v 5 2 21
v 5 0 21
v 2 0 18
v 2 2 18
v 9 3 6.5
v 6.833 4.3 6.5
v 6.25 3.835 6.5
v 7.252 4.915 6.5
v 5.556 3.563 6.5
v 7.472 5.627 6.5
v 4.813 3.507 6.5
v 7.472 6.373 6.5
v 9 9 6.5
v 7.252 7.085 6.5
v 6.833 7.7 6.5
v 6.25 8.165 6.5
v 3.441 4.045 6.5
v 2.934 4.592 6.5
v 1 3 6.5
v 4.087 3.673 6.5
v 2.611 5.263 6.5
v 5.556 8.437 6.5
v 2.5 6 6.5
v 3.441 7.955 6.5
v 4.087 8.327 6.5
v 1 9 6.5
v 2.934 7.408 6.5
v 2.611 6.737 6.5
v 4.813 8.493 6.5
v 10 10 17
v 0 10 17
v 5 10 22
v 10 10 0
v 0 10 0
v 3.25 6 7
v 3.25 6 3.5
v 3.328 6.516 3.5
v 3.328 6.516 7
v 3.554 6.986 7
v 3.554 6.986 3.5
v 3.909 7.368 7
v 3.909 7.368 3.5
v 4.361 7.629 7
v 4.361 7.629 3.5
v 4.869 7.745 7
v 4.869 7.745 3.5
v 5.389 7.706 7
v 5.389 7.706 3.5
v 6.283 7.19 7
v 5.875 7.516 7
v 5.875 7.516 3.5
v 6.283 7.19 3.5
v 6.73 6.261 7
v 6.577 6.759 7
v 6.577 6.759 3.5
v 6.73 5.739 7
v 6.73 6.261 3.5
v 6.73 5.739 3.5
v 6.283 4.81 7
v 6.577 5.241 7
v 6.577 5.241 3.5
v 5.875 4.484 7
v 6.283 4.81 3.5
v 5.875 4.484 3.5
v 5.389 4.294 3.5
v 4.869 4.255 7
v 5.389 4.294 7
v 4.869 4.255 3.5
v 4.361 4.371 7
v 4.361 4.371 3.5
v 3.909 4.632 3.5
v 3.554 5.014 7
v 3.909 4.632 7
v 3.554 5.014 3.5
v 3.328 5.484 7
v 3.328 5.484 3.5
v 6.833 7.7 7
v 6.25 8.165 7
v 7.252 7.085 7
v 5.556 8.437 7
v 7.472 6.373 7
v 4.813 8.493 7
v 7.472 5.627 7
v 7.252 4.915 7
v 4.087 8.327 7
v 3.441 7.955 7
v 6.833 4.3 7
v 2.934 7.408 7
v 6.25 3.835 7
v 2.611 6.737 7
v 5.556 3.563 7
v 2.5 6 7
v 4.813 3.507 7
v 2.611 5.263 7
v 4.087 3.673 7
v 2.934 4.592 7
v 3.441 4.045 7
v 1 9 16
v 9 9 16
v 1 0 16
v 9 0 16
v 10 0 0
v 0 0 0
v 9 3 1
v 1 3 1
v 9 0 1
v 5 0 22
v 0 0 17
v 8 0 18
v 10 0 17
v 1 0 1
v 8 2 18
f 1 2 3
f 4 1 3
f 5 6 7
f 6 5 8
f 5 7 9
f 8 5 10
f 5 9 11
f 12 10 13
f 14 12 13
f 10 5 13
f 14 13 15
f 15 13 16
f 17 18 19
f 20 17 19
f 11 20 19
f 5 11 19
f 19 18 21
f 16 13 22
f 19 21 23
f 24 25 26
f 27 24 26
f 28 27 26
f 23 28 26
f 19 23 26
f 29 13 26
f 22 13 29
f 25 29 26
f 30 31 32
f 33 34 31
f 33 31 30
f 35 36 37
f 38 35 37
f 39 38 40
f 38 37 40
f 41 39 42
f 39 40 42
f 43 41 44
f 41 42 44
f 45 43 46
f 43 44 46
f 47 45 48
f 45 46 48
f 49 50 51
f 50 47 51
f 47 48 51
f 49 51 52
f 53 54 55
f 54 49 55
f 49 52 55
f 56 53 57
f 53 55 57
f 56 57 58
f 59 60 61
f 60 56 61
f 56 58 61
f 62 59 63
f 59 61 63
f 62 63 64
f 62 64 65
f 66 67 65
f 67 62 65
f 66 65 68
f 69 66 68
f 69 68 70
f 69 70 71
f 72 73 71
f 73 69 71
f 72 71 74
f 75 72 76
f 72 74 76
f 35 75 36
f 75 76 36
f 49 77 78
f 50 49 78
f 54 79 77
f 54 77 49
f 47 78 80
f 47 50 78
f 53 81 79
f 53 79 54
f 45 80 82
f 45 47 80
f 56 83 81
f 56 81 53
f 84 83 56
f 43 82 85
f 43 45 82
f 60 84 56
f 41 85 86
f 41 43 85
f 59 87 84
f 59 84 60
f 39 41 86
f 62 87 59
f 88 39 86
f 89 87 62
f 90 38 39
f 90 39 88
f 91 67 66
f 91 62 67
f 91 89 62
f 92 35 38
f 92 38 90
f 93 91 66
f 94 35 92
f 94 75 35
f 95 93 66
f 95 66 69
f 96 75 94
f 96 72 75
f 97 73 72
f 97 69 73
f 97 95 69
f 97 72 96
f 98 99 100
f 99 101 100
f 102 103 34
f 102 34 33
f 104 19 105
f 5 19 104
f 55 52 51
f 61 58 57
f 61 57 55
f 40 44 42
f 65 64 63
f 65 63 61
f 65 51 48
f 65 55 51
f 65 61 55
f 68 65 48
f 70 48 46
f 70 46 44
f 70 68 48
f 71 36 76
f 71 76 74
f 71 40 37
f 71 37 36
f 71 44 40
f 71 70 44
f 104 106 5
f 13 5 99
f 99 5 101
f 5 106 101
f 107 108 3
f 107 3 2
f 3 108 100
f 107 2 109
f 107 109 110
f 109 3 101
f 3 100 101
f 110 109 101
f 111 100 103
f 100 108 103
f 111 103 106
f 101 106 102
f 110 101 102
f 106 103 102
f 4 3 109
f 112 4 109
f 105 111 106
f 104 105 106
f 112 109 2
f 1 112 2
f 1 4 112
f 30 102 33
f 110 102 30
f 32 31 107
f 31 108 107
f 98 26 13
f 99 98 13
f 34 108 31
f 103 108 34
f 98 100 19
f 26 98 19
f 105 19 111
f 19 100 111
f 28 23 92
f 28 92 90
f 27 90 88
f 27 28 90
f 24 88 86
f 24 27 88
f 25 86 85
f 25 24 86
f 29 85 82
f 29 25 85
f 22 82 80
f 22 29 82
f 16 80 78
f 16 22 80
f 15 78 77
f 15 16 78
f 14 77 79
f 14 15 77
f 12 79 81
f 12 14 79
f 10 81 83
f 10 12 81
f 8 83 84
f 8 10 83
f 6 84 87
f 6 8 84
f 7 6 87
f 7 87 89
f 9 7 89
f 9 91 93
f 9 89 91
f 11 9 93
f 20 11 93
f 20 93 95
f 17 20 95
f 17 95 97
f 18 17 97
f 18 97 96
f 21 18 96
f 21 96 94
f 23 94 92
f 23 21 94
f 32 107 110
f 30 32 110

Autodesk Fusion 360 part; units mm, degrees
sketch "Sketch1" plane through (0, 0, 0) normal (0, 1, 0) x (1, 0, 0)
  line L0 (0, 0) -> (10, 0)
  line L1 (10, 0) -> (10, -17)
  line L2 (0, -17) -> (0, 0)
  line L3 (0, -17) -> (5, -22)
  line L4 (5, -22) -> (10, -17)
  dimension "d1" = 10
  dimension "d2" = 17
extrude "Extrude1" add sketch "Sketch1" along normal blind 10
sketch "Sketch2" plane through (0, 0, 0) normal (0, 1, 0) x (1, 0, 0)
  line L0 (1, -1) -> (9, -1)
  line L1 (9, -1) -> (9, -16)
  line L2 (9, -16) -> (1, -16)
  line L3 (1, -16) -> (1, -1)
  line L4 (2, -18) -> (8, -18)
  line L5 (8, -18) -> (5, -21)
  line L6 (5, -21) -> (2, -18)
extrude "Extrude2" cut sketch "Sketch2" along normal blind 2 contours L4 L5 L6
extrude "Extrude3" cut sketch "Sketch2" along normal blind 9 contours L0 L1 L2 L3
sketch "Sketch3" plane through (0, 9, 0) normal (0, -1, 0) x (1, 0, 0)
  line L0 (9, 16) -> (1, 16)
  line L1 (1, 16) -> (1, 1)
  line L2 (1, 1) -> (9, 1)
  line L3 (9, 1) -> (9, 16)
  line L4 (1, 1) -> (9, 1)
  line L5 (9, 1) -> (9, 6.5)
  line L6 (9, 6.5) -> (1, 6.5)
  line L7 (1, 6.5) -> (1, 1)
extrude "Extrude4" add sketch "Sketch3" along normal blind 6 contours L1 L2 L3 L4 L5 L6 L7
sketch "Sketch4" plane through (0, 0, 6.5) normal (0, 0, 1) x (-1, 0, 0)
  line L0 (-9, -9) -> (-1, -9)
  line L1 (-1, -9) -> (-1, -3)
  line L2 (-1, -3) -> (-9, -3)
  line L3 (-9, -3) -> (-9, -9)
  circle A0 centre (-5, -6) radius 2.5
  circle A1 centre (-5, -6) radius 1.75
  dimension "d11" = 5
  dimension "d12" = 3.5
extrude "Extrude5" add sketch "Sketch4" along normal blind 0.5 contours A0
extrude "Extrude6" cut sketch "Sketch4" against normal blind 3 contours A1
